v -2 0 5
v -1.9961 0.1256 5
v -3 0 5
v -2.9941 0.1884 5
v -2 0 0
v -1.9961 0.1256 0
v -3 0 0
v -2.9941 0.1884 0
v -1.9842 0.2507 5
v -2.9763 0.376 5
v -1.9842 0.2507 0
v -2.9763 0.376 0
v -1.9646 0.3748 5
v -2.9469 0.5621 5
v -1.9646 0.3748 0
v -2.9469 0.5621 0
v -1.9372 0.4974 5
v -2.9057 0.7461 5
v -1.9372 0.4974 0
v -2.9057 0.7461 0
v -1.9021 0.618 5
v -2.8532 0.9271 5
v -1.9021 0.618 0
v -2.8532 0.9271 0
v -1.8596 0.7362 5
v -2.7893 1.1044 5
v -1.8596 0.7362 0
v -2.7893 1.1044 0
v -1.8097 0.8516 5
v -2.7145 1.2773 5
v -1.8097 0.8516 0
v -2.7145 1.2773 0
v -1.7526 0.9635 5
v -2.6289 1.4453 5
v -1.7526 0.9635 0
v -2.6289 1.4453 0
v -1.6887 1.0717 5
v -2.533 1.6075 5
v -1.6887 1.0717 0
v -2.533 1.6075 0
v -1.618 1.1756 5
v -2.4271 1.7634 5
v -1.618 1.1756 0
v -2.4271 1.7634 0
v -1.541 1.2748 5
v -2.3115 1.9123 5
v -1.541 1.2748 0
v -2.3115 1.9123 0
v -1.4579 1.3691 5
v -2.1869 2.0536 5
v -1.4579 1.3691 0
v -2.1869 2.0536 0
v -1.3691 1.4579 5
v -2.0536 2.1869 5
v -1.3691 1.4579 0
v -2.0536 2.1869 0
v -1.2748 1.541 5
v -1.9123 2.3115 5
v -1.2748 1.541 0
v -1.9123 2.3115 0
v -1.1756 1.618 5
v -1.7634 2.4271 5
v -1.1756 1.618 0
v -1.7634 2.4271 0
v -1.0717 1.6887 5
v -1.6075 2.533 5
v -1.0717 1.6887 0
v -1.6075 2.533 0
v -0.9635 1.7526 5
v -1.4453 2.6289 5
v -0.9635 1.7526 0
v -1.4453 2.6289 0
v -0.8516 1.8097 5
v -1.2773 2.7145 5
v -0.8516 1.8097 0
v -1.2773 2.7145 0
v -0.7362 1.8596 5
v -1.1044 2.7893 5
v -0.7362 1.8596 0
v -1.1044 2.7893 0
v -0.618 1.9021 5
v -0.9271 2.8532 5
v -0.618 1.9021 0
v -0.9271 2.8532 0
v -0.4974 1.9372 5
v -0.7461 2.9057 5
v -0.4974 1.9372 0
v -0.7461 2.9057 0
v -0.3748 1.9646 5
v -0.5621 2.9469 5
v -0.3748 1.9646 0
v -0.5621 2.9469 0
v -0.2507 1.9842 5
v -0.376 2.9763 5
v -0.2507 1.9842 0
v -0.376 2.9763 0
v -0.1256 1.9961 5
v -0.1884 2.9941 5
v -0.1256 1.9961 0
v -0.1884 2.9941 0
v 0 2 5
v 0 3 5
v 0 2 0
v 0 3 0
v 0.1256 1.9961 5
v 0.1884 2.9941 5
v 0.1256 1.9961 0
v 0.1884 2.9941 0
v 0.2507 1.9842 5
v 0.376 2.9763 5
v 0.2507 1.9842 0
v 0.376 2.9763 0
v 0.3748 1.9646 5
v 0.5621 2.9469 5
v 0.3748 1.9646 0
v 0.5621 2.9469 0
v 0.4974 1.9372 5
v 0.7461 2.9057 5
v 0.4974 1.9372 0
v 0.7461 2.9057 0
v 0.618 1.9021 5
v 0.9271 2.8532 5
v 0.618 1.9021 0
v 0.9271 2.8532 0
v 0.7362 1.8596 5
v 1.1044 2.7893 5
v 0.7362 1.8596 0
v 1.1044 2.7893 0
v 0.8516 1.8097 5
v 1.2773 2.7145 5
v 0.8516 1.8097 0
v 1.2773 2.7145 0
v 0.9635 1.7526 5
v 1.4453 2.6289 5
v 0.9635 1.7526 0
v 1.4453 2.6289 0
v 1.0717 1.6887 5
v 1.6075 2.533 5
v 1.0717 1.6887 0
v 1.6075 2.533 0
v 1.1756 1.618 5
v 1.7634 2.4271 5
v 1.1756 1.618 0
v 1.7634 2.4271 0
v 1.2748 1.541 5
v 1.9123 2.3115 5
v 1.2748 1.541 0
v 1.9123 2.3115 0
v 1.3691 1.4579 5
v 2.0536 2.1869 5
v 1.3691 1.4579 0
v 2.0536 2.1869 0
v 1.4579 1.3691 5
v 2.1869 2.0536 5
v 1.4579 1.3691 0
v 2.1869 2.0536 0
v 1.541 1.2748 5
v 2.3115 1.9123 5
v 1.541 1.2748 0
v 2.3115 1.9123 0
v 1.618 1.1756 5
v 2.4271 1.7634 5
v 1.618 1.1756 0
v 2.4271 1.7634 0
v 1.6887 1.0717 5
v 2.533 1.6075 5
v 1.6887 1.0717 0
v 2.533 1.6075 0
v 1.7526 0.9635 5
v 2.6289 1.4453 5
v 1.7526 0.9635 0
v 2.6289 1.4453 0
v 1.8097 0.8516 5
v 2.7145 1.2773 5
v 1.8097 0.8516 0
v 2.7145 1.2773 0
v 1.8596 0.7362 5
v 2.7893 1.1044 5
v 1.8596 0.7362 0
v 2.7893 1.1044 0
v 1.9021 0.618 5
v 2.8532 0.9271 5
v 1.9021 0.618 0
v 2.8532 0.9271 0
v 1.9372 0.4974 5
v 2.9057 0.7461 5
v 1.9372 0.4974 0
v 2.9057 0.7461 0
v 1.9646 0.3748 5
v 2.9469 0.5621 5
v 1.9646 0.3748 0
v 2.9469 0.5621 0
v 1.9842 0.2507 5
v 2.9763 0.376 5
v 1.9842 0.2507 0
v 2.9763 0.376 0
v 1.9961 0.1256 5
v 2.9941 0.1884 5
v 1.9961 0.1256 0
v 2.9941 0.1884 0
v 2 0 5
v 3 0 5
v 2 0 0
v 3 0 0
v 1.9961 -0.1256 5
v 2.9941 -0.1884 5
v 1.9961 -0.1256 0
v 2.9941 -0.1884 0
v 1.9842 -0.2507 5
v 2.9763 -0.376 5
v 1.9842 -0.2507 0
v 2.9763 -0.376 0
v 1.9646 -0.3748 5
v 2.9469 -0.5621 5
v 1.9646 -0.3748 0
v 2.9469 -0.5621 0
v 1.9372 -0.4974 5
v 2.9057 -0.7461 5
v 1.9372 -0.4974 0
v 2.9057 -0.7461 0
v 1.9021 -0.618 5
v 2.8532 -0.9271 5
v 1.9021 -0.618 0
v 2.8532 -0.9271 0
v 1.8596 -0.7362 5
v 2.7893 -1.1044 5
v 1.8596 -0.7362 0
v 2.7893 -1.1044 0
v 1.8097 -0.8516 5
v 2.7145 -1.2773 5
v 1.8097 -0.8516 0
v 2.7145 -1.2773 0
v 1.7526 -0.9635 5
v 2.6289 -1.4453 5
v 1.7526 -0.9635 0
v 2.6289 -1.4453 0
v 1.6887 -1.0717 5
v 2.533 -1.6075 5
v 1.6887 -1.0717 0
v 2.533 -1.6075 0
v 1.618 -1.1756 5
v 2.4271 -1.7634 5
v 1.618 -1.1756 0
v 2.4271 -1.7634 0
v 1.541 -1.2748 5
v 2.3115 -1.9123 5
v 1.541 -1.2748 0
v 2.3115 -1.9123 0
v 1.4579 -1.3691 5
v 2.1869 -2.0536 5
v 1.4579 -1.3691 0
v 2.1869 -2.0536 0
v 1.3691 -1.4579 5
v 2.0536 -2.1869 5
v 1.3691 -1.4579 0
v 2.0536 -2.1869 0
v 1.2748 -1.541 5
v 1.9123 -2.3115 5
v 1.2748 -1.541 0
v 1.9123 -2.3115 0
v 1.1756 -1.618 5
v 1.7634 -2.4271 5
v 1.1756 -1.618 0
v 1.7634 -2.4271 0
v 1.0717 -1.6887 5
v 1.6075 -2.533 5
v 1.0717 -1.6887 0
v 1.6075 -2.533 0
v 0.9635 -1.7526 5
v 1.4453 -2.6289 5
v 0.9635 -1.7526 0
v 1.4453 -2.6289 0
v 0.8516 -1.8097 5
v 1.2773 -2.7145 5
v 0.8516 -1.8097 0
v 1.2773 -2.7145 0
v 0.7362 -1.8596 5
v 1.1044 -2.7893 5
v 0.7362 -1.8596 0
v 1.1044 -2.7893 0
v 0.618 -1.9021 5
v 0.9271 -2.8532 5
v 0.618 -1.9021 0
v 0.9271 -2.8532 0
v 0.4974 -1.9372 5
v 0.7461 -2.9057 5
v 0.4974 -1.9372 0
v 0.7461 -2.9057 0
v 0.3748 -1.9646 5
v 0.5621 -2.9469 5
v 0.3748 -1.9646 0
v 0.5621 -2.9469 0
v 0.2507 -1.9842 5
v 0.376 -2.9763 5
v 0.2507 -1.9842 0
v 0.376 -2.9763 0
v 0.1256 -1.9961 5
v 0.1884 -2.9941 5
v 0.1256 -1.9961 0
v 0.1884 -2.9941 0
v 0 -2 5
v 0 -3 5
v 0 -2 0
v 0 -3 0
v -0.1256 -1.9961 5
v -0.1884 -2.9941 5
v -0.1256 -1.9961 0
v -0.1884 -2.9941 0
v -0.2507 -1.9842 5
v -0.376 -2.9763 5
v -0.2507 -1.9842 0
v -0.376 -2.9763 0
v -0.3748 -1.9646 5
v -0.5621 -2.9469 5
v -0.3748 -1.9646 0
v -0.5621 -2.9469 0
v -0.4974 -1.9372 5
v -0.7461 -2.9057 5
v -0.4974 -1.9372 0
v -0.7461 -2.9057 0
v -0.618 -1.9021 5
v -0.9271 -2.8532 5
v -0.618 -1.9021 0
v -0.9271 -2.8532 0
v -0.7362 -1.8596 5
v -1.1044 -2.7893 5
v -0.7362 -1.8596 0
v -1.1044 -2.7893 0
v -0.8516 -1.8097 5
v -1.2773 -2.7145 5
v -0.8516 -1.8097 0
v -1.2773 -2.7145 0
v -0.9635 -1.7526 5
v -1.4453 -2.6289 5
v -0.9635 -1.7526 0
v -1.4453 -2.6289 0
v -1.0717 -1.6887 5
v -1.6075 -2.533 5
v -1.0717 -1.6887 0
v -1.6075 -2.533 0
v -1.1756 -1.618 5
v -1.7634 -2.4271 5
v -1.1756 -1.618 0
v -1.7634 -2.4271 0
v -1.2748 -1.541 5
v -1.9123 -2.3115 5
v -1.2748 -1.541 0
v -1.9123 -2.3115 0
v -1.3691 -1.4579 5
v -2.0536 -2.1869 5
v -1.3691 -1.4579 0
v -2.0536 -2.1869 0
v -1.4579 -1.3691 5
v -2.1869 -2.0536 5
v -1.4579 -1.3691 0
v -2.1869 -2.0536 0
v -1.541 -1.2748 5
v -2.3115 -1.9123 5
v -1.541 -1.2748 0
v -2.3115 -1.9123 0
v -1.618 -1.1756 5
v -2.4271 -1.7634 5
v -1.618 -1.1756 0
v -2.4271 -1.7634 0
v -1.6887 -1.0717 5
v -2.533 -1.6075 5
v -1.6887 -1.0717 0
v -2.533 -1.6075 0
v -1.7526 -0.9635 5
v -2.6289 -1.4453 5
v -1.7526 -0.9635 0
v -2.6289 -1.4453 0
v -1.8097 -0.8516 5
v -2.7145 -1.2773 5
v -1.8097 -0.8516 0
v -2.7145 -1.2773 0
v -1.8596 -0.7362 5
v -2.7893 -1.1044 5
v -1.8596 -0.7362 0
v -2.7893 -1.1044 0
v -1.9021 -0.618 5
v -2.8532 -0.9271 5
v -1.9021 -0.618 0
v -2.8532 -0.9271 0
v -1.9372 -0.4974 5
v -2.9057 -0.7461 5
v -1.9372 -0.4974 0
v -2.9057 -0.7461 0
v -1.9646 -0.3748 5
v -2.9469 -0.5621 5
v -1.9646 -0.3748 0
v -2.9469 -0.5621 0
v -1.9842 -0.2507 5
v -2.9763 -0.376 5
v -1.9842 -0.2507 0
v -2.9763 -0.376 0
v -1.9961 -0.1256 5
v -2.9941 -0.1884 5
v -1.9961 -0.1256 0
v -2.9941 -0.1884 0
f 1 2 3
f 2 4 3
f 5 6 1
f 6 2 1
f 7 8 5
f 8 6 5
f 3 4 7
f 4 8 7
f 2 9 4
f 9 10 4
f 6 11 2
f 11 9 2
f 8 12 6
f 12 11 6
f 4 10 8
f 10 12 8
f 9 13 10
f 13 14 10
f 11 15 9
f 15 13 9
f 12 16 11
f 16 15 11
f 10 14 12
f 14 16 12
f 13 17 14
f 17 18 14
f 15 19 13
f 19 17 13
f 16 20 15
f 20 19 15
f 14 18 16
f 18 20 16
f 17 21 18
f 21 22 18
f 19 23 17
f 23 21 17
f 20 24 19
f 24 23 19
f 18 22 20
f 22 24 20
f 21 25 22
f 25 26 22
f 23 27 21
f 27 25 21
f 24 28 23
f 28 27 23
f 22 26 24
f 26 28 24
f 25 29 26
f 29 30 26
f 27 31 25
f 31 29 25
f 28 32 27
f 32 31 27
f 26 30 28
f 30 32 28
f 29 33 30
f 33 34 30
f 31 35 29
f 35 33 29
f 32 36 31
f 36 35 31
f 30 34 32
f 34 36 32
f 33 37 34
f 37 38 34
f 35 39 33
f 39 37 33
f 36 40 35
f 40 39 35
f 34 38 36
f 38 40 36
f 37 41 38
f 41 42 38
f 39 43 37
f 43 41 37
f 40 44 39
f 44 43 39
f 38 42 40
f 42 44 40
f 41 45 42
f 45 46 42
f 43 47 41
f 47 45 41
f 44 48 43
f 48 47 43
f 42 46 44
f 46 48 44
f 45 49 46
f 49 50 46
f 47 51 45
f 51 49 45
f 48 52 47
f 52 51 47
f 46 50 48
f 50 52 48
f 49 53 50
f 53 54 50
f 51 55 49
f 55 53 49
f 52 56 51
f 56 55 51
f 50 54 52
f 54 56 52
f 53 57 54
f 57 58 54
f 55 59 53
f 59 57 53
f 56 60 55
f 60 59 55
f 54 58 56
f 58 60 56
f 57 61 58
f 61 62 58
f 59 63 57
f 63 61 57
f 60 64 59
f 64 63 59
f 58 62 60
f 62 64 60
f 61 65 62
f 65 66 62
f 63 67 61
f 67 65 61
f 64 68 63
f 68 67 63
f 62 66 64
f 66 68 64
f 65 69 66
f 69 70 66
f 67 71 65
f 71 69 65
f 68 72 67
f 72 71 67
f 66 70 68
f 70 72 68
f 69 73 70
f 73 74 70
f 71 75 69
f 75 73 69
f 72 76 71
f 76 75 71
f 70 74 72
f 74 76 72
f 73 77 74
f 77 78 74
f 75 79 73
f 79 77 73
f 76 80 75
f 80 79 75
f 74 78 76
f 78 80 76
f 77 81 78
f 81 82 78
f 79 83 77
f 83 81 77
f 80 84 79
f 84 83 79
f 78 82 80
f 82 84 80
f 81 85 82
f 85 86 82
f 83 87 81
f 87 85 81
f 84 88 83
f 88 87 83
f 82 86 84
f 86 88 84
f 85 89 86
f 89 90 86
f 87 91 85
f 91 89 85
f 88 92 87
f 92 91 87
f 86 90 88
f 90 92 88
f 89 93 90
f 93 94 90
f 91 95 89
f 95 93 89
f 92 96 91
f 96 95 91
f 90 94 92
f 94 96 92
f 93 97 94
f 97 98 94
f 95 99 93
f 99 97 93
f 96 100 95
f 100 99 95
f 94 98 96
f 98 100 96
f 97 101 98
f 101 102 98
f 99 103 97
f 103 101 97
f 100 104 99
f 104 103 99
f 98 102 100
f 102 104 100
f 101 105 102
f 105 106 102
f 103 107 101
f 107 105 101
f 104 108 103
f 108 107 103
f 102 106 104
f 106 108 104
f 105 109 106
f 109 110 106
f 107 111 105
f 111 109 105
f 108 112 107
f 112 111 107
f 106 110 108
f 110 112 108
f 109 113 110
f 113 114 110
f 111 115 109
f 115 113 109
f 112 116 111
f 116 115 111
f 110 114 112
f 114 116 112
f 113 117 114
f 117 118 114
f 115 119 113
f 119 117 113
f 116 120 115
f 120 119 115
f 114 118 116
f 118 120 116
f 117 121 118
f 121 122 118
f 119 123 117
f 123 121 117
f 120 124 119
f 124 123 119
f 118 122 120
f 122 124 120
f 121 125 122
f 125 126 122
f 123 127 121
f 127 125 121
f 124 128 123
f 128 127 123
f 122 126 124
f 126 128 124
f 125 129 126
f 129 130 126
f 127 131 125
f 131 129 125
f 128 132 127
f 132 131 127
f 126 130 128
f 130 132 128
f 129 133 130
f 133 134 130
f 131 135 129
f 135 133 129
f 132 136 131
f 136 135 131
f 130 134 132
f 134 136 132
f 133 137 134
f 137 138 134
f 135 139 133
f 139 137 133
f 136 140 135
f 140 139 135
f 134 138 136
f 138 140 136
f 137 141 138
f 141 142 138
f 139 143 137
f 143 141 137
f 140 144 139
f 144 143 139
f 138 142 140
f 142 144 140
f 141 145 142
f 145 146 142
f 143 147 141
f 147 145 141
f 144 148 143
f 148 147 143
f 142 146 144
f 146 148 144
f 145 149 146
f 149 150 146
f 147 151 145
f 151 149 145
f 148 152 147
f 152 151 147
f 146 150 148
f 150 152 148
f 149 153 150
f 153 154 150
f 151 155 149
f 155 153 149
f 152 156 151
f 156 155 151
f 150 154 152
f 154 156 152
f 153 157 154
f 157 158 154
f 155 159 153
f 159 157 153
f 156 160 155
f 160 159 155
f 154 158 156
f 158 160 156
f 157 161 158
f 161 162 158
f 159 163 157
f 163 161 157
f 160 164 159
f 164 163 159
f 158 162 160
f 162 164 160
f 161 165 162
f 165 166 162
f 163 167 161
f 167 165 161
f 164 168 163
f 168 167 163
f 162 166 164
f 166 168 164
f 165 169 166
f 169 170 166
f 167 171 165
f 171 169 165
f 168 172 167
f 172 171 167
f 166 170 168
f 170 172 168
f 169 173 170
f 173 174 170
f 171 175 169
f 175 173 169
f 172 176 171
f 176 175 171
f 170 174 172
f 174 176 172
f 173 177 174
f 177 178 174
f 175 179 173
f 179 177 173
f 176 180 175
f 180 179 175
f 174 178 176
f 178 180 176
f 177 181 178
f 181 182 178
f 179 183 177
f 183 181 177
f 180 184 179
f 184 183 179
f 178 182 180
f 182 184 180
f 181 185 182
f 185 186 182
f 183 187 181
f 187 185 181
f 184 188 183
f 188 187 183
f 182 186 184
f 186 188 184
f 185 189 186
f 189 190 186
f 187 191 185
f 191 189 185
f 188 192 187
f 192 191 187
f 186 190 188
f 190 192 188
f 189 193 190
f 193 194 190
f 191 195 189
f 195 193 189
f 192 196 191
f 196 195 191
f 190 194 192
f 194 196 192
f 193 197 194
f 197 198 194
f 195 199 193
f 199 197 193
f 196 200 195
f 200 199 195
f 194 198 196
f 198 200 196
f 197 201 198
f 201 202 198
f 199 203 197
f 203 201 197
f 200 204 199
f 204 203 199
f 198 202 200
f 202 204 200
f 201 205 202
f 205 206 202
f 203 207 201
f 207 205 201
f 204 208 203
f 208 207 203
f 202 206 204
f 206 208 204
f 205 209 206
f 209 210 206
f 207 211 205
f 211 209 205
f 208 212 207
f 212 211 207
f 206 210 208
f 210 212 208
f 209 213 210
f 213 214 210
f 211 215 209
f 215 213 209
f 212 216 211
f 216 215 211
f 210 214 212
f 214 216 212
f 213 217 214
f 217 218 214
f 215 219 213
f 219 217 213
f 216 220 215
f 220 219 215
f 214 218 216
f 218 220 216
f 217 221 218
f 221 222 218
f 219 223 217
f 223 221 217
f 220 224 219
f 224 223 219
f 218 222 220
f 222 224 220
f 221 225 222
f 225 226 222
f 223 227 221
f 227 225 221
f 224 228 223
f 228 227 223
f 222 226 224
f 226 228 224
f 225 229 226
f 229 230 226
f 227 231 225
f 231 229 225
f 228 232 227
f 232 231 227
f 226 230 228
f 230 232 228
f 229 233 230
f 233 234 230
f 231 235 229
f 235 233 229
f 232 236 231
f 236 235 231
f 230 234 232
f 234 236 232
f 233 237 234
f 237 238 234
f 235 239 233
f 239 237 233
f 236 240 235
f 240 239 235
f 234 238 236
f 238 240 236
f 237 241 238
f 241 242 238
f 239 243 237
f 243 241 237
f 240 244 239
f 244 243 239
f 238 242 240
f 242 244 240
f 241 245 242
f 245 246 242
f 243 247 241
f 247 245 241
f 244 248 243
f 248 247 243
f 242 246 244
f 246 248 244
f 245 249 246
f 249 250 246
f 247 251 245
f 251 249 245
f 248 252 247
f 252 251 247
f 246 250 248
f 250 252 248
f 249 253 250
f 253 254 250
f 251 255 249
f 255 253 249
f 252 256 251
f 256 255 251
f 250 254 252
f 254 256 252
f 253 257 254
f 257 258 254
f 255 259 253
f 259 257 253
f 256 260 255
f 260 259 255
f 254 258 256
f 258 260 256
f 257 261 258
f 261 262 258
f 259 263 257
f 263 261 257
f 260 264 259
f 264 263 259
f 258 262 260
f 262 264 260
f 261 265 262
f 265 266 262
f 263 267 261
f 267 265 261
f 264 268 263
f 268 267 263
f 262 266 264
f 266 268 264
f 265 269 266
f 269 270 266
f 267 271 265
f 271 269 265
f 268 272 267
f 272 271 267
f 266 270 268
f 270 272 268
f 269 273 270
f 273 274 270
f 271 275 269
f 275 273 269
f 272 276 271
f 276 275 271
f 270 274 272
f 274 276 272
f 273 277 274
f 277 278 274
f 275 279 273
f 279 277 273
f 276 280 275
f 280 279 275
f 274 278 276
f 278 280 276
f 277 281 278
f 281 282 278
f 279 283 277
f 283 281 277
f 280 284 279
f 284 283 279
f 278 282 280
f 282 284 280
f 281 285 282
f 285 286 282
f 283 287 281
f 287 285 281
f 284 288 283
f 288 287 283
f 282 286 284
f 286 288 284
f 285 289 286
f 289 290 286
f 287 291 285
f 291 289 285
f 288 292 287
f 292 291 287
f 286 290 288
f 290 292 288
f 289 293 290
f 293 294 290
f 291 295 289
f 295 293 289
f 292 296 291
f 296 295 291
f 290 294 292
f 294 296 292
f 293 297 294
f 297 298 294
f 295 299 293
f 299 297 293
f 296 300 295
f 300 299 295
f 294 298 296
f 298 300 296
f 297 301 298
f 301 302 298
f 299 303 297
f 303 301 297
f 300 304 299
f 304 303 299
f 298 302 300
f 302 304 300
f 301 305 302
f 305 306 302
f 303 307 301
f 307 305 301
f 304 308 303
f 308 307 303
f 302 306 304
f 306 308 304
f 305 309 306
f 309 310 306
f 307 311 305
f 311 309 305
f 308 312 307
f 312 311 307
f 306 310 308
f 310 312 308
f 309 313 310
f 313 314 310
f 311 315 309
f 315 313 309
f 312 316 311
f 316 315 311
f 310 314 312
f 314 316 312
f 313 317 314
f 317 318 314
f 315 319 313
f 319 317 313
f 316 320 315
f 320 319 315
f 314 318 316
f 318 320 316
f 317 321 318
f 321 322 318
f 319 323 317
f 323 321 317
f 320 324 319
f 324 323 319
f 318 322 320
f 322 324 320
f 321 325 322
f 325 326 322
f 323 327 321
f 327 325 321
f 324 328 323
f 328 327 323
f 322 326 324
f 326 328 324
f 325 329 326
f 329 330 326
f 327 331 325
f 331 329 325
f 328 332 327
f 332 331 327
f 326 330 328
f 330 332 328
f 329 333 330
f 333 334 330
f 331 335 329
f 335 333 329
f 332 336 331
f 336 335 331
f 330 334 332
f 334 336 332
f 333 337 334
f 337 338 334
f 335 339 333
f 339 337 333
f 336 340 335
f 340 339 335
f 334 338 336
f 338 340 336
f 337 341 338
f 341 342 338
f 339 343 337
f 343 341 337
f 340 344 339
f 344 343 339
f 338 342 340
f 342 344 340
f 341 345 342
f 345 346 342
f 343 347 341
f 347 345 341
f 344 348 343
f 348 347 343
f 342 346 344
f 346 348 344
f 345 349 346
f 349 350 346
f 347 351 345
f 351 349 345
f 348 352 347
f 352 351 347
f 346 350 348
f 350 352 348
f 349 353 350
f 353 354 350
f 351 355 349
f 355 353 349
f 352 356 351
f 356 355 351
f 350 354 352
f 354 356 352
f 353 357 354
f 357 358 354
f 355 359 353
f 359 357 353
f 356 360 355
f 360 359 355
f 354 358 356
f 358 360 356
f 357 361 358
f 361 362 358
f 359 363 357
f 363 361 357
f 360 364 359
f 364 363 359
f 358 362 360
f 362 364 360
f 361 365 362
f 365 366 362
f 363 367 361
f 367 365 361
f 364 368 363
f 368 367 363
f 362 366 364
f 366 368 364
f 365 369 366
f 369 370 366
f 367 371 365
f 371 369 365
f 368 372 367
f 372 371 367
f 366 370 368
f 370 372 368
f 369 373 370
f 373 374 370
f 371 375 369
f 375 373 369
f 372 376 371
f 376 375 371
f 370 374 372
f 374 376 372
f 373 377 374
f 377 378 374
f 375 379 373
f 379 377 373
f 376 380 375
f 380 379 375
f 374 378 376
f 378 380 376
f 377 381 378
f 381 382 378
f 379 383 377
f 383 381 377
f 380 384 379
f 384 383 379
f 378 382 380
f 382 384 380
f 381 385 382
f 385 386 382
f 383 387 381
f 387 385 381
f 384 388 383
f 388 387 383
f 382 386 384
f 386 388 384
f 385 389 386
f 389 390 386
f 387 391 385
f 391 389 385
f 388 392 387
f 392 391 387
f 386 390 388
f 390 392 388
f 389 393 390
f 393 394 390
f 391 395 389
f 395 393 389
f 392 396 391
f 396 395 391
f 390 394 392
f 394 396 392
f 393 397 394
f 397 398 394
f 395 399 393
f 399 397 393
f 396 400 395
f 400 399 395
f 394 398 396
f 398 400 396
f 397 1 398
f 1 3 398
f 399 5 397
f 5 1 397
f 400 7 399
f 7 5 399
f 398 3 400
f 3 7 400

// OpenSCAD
$fn=100;
rotate_extrude () {
    polygon (points = [[2,0], [2,5], [3, 5], [3, 0]]);
}
